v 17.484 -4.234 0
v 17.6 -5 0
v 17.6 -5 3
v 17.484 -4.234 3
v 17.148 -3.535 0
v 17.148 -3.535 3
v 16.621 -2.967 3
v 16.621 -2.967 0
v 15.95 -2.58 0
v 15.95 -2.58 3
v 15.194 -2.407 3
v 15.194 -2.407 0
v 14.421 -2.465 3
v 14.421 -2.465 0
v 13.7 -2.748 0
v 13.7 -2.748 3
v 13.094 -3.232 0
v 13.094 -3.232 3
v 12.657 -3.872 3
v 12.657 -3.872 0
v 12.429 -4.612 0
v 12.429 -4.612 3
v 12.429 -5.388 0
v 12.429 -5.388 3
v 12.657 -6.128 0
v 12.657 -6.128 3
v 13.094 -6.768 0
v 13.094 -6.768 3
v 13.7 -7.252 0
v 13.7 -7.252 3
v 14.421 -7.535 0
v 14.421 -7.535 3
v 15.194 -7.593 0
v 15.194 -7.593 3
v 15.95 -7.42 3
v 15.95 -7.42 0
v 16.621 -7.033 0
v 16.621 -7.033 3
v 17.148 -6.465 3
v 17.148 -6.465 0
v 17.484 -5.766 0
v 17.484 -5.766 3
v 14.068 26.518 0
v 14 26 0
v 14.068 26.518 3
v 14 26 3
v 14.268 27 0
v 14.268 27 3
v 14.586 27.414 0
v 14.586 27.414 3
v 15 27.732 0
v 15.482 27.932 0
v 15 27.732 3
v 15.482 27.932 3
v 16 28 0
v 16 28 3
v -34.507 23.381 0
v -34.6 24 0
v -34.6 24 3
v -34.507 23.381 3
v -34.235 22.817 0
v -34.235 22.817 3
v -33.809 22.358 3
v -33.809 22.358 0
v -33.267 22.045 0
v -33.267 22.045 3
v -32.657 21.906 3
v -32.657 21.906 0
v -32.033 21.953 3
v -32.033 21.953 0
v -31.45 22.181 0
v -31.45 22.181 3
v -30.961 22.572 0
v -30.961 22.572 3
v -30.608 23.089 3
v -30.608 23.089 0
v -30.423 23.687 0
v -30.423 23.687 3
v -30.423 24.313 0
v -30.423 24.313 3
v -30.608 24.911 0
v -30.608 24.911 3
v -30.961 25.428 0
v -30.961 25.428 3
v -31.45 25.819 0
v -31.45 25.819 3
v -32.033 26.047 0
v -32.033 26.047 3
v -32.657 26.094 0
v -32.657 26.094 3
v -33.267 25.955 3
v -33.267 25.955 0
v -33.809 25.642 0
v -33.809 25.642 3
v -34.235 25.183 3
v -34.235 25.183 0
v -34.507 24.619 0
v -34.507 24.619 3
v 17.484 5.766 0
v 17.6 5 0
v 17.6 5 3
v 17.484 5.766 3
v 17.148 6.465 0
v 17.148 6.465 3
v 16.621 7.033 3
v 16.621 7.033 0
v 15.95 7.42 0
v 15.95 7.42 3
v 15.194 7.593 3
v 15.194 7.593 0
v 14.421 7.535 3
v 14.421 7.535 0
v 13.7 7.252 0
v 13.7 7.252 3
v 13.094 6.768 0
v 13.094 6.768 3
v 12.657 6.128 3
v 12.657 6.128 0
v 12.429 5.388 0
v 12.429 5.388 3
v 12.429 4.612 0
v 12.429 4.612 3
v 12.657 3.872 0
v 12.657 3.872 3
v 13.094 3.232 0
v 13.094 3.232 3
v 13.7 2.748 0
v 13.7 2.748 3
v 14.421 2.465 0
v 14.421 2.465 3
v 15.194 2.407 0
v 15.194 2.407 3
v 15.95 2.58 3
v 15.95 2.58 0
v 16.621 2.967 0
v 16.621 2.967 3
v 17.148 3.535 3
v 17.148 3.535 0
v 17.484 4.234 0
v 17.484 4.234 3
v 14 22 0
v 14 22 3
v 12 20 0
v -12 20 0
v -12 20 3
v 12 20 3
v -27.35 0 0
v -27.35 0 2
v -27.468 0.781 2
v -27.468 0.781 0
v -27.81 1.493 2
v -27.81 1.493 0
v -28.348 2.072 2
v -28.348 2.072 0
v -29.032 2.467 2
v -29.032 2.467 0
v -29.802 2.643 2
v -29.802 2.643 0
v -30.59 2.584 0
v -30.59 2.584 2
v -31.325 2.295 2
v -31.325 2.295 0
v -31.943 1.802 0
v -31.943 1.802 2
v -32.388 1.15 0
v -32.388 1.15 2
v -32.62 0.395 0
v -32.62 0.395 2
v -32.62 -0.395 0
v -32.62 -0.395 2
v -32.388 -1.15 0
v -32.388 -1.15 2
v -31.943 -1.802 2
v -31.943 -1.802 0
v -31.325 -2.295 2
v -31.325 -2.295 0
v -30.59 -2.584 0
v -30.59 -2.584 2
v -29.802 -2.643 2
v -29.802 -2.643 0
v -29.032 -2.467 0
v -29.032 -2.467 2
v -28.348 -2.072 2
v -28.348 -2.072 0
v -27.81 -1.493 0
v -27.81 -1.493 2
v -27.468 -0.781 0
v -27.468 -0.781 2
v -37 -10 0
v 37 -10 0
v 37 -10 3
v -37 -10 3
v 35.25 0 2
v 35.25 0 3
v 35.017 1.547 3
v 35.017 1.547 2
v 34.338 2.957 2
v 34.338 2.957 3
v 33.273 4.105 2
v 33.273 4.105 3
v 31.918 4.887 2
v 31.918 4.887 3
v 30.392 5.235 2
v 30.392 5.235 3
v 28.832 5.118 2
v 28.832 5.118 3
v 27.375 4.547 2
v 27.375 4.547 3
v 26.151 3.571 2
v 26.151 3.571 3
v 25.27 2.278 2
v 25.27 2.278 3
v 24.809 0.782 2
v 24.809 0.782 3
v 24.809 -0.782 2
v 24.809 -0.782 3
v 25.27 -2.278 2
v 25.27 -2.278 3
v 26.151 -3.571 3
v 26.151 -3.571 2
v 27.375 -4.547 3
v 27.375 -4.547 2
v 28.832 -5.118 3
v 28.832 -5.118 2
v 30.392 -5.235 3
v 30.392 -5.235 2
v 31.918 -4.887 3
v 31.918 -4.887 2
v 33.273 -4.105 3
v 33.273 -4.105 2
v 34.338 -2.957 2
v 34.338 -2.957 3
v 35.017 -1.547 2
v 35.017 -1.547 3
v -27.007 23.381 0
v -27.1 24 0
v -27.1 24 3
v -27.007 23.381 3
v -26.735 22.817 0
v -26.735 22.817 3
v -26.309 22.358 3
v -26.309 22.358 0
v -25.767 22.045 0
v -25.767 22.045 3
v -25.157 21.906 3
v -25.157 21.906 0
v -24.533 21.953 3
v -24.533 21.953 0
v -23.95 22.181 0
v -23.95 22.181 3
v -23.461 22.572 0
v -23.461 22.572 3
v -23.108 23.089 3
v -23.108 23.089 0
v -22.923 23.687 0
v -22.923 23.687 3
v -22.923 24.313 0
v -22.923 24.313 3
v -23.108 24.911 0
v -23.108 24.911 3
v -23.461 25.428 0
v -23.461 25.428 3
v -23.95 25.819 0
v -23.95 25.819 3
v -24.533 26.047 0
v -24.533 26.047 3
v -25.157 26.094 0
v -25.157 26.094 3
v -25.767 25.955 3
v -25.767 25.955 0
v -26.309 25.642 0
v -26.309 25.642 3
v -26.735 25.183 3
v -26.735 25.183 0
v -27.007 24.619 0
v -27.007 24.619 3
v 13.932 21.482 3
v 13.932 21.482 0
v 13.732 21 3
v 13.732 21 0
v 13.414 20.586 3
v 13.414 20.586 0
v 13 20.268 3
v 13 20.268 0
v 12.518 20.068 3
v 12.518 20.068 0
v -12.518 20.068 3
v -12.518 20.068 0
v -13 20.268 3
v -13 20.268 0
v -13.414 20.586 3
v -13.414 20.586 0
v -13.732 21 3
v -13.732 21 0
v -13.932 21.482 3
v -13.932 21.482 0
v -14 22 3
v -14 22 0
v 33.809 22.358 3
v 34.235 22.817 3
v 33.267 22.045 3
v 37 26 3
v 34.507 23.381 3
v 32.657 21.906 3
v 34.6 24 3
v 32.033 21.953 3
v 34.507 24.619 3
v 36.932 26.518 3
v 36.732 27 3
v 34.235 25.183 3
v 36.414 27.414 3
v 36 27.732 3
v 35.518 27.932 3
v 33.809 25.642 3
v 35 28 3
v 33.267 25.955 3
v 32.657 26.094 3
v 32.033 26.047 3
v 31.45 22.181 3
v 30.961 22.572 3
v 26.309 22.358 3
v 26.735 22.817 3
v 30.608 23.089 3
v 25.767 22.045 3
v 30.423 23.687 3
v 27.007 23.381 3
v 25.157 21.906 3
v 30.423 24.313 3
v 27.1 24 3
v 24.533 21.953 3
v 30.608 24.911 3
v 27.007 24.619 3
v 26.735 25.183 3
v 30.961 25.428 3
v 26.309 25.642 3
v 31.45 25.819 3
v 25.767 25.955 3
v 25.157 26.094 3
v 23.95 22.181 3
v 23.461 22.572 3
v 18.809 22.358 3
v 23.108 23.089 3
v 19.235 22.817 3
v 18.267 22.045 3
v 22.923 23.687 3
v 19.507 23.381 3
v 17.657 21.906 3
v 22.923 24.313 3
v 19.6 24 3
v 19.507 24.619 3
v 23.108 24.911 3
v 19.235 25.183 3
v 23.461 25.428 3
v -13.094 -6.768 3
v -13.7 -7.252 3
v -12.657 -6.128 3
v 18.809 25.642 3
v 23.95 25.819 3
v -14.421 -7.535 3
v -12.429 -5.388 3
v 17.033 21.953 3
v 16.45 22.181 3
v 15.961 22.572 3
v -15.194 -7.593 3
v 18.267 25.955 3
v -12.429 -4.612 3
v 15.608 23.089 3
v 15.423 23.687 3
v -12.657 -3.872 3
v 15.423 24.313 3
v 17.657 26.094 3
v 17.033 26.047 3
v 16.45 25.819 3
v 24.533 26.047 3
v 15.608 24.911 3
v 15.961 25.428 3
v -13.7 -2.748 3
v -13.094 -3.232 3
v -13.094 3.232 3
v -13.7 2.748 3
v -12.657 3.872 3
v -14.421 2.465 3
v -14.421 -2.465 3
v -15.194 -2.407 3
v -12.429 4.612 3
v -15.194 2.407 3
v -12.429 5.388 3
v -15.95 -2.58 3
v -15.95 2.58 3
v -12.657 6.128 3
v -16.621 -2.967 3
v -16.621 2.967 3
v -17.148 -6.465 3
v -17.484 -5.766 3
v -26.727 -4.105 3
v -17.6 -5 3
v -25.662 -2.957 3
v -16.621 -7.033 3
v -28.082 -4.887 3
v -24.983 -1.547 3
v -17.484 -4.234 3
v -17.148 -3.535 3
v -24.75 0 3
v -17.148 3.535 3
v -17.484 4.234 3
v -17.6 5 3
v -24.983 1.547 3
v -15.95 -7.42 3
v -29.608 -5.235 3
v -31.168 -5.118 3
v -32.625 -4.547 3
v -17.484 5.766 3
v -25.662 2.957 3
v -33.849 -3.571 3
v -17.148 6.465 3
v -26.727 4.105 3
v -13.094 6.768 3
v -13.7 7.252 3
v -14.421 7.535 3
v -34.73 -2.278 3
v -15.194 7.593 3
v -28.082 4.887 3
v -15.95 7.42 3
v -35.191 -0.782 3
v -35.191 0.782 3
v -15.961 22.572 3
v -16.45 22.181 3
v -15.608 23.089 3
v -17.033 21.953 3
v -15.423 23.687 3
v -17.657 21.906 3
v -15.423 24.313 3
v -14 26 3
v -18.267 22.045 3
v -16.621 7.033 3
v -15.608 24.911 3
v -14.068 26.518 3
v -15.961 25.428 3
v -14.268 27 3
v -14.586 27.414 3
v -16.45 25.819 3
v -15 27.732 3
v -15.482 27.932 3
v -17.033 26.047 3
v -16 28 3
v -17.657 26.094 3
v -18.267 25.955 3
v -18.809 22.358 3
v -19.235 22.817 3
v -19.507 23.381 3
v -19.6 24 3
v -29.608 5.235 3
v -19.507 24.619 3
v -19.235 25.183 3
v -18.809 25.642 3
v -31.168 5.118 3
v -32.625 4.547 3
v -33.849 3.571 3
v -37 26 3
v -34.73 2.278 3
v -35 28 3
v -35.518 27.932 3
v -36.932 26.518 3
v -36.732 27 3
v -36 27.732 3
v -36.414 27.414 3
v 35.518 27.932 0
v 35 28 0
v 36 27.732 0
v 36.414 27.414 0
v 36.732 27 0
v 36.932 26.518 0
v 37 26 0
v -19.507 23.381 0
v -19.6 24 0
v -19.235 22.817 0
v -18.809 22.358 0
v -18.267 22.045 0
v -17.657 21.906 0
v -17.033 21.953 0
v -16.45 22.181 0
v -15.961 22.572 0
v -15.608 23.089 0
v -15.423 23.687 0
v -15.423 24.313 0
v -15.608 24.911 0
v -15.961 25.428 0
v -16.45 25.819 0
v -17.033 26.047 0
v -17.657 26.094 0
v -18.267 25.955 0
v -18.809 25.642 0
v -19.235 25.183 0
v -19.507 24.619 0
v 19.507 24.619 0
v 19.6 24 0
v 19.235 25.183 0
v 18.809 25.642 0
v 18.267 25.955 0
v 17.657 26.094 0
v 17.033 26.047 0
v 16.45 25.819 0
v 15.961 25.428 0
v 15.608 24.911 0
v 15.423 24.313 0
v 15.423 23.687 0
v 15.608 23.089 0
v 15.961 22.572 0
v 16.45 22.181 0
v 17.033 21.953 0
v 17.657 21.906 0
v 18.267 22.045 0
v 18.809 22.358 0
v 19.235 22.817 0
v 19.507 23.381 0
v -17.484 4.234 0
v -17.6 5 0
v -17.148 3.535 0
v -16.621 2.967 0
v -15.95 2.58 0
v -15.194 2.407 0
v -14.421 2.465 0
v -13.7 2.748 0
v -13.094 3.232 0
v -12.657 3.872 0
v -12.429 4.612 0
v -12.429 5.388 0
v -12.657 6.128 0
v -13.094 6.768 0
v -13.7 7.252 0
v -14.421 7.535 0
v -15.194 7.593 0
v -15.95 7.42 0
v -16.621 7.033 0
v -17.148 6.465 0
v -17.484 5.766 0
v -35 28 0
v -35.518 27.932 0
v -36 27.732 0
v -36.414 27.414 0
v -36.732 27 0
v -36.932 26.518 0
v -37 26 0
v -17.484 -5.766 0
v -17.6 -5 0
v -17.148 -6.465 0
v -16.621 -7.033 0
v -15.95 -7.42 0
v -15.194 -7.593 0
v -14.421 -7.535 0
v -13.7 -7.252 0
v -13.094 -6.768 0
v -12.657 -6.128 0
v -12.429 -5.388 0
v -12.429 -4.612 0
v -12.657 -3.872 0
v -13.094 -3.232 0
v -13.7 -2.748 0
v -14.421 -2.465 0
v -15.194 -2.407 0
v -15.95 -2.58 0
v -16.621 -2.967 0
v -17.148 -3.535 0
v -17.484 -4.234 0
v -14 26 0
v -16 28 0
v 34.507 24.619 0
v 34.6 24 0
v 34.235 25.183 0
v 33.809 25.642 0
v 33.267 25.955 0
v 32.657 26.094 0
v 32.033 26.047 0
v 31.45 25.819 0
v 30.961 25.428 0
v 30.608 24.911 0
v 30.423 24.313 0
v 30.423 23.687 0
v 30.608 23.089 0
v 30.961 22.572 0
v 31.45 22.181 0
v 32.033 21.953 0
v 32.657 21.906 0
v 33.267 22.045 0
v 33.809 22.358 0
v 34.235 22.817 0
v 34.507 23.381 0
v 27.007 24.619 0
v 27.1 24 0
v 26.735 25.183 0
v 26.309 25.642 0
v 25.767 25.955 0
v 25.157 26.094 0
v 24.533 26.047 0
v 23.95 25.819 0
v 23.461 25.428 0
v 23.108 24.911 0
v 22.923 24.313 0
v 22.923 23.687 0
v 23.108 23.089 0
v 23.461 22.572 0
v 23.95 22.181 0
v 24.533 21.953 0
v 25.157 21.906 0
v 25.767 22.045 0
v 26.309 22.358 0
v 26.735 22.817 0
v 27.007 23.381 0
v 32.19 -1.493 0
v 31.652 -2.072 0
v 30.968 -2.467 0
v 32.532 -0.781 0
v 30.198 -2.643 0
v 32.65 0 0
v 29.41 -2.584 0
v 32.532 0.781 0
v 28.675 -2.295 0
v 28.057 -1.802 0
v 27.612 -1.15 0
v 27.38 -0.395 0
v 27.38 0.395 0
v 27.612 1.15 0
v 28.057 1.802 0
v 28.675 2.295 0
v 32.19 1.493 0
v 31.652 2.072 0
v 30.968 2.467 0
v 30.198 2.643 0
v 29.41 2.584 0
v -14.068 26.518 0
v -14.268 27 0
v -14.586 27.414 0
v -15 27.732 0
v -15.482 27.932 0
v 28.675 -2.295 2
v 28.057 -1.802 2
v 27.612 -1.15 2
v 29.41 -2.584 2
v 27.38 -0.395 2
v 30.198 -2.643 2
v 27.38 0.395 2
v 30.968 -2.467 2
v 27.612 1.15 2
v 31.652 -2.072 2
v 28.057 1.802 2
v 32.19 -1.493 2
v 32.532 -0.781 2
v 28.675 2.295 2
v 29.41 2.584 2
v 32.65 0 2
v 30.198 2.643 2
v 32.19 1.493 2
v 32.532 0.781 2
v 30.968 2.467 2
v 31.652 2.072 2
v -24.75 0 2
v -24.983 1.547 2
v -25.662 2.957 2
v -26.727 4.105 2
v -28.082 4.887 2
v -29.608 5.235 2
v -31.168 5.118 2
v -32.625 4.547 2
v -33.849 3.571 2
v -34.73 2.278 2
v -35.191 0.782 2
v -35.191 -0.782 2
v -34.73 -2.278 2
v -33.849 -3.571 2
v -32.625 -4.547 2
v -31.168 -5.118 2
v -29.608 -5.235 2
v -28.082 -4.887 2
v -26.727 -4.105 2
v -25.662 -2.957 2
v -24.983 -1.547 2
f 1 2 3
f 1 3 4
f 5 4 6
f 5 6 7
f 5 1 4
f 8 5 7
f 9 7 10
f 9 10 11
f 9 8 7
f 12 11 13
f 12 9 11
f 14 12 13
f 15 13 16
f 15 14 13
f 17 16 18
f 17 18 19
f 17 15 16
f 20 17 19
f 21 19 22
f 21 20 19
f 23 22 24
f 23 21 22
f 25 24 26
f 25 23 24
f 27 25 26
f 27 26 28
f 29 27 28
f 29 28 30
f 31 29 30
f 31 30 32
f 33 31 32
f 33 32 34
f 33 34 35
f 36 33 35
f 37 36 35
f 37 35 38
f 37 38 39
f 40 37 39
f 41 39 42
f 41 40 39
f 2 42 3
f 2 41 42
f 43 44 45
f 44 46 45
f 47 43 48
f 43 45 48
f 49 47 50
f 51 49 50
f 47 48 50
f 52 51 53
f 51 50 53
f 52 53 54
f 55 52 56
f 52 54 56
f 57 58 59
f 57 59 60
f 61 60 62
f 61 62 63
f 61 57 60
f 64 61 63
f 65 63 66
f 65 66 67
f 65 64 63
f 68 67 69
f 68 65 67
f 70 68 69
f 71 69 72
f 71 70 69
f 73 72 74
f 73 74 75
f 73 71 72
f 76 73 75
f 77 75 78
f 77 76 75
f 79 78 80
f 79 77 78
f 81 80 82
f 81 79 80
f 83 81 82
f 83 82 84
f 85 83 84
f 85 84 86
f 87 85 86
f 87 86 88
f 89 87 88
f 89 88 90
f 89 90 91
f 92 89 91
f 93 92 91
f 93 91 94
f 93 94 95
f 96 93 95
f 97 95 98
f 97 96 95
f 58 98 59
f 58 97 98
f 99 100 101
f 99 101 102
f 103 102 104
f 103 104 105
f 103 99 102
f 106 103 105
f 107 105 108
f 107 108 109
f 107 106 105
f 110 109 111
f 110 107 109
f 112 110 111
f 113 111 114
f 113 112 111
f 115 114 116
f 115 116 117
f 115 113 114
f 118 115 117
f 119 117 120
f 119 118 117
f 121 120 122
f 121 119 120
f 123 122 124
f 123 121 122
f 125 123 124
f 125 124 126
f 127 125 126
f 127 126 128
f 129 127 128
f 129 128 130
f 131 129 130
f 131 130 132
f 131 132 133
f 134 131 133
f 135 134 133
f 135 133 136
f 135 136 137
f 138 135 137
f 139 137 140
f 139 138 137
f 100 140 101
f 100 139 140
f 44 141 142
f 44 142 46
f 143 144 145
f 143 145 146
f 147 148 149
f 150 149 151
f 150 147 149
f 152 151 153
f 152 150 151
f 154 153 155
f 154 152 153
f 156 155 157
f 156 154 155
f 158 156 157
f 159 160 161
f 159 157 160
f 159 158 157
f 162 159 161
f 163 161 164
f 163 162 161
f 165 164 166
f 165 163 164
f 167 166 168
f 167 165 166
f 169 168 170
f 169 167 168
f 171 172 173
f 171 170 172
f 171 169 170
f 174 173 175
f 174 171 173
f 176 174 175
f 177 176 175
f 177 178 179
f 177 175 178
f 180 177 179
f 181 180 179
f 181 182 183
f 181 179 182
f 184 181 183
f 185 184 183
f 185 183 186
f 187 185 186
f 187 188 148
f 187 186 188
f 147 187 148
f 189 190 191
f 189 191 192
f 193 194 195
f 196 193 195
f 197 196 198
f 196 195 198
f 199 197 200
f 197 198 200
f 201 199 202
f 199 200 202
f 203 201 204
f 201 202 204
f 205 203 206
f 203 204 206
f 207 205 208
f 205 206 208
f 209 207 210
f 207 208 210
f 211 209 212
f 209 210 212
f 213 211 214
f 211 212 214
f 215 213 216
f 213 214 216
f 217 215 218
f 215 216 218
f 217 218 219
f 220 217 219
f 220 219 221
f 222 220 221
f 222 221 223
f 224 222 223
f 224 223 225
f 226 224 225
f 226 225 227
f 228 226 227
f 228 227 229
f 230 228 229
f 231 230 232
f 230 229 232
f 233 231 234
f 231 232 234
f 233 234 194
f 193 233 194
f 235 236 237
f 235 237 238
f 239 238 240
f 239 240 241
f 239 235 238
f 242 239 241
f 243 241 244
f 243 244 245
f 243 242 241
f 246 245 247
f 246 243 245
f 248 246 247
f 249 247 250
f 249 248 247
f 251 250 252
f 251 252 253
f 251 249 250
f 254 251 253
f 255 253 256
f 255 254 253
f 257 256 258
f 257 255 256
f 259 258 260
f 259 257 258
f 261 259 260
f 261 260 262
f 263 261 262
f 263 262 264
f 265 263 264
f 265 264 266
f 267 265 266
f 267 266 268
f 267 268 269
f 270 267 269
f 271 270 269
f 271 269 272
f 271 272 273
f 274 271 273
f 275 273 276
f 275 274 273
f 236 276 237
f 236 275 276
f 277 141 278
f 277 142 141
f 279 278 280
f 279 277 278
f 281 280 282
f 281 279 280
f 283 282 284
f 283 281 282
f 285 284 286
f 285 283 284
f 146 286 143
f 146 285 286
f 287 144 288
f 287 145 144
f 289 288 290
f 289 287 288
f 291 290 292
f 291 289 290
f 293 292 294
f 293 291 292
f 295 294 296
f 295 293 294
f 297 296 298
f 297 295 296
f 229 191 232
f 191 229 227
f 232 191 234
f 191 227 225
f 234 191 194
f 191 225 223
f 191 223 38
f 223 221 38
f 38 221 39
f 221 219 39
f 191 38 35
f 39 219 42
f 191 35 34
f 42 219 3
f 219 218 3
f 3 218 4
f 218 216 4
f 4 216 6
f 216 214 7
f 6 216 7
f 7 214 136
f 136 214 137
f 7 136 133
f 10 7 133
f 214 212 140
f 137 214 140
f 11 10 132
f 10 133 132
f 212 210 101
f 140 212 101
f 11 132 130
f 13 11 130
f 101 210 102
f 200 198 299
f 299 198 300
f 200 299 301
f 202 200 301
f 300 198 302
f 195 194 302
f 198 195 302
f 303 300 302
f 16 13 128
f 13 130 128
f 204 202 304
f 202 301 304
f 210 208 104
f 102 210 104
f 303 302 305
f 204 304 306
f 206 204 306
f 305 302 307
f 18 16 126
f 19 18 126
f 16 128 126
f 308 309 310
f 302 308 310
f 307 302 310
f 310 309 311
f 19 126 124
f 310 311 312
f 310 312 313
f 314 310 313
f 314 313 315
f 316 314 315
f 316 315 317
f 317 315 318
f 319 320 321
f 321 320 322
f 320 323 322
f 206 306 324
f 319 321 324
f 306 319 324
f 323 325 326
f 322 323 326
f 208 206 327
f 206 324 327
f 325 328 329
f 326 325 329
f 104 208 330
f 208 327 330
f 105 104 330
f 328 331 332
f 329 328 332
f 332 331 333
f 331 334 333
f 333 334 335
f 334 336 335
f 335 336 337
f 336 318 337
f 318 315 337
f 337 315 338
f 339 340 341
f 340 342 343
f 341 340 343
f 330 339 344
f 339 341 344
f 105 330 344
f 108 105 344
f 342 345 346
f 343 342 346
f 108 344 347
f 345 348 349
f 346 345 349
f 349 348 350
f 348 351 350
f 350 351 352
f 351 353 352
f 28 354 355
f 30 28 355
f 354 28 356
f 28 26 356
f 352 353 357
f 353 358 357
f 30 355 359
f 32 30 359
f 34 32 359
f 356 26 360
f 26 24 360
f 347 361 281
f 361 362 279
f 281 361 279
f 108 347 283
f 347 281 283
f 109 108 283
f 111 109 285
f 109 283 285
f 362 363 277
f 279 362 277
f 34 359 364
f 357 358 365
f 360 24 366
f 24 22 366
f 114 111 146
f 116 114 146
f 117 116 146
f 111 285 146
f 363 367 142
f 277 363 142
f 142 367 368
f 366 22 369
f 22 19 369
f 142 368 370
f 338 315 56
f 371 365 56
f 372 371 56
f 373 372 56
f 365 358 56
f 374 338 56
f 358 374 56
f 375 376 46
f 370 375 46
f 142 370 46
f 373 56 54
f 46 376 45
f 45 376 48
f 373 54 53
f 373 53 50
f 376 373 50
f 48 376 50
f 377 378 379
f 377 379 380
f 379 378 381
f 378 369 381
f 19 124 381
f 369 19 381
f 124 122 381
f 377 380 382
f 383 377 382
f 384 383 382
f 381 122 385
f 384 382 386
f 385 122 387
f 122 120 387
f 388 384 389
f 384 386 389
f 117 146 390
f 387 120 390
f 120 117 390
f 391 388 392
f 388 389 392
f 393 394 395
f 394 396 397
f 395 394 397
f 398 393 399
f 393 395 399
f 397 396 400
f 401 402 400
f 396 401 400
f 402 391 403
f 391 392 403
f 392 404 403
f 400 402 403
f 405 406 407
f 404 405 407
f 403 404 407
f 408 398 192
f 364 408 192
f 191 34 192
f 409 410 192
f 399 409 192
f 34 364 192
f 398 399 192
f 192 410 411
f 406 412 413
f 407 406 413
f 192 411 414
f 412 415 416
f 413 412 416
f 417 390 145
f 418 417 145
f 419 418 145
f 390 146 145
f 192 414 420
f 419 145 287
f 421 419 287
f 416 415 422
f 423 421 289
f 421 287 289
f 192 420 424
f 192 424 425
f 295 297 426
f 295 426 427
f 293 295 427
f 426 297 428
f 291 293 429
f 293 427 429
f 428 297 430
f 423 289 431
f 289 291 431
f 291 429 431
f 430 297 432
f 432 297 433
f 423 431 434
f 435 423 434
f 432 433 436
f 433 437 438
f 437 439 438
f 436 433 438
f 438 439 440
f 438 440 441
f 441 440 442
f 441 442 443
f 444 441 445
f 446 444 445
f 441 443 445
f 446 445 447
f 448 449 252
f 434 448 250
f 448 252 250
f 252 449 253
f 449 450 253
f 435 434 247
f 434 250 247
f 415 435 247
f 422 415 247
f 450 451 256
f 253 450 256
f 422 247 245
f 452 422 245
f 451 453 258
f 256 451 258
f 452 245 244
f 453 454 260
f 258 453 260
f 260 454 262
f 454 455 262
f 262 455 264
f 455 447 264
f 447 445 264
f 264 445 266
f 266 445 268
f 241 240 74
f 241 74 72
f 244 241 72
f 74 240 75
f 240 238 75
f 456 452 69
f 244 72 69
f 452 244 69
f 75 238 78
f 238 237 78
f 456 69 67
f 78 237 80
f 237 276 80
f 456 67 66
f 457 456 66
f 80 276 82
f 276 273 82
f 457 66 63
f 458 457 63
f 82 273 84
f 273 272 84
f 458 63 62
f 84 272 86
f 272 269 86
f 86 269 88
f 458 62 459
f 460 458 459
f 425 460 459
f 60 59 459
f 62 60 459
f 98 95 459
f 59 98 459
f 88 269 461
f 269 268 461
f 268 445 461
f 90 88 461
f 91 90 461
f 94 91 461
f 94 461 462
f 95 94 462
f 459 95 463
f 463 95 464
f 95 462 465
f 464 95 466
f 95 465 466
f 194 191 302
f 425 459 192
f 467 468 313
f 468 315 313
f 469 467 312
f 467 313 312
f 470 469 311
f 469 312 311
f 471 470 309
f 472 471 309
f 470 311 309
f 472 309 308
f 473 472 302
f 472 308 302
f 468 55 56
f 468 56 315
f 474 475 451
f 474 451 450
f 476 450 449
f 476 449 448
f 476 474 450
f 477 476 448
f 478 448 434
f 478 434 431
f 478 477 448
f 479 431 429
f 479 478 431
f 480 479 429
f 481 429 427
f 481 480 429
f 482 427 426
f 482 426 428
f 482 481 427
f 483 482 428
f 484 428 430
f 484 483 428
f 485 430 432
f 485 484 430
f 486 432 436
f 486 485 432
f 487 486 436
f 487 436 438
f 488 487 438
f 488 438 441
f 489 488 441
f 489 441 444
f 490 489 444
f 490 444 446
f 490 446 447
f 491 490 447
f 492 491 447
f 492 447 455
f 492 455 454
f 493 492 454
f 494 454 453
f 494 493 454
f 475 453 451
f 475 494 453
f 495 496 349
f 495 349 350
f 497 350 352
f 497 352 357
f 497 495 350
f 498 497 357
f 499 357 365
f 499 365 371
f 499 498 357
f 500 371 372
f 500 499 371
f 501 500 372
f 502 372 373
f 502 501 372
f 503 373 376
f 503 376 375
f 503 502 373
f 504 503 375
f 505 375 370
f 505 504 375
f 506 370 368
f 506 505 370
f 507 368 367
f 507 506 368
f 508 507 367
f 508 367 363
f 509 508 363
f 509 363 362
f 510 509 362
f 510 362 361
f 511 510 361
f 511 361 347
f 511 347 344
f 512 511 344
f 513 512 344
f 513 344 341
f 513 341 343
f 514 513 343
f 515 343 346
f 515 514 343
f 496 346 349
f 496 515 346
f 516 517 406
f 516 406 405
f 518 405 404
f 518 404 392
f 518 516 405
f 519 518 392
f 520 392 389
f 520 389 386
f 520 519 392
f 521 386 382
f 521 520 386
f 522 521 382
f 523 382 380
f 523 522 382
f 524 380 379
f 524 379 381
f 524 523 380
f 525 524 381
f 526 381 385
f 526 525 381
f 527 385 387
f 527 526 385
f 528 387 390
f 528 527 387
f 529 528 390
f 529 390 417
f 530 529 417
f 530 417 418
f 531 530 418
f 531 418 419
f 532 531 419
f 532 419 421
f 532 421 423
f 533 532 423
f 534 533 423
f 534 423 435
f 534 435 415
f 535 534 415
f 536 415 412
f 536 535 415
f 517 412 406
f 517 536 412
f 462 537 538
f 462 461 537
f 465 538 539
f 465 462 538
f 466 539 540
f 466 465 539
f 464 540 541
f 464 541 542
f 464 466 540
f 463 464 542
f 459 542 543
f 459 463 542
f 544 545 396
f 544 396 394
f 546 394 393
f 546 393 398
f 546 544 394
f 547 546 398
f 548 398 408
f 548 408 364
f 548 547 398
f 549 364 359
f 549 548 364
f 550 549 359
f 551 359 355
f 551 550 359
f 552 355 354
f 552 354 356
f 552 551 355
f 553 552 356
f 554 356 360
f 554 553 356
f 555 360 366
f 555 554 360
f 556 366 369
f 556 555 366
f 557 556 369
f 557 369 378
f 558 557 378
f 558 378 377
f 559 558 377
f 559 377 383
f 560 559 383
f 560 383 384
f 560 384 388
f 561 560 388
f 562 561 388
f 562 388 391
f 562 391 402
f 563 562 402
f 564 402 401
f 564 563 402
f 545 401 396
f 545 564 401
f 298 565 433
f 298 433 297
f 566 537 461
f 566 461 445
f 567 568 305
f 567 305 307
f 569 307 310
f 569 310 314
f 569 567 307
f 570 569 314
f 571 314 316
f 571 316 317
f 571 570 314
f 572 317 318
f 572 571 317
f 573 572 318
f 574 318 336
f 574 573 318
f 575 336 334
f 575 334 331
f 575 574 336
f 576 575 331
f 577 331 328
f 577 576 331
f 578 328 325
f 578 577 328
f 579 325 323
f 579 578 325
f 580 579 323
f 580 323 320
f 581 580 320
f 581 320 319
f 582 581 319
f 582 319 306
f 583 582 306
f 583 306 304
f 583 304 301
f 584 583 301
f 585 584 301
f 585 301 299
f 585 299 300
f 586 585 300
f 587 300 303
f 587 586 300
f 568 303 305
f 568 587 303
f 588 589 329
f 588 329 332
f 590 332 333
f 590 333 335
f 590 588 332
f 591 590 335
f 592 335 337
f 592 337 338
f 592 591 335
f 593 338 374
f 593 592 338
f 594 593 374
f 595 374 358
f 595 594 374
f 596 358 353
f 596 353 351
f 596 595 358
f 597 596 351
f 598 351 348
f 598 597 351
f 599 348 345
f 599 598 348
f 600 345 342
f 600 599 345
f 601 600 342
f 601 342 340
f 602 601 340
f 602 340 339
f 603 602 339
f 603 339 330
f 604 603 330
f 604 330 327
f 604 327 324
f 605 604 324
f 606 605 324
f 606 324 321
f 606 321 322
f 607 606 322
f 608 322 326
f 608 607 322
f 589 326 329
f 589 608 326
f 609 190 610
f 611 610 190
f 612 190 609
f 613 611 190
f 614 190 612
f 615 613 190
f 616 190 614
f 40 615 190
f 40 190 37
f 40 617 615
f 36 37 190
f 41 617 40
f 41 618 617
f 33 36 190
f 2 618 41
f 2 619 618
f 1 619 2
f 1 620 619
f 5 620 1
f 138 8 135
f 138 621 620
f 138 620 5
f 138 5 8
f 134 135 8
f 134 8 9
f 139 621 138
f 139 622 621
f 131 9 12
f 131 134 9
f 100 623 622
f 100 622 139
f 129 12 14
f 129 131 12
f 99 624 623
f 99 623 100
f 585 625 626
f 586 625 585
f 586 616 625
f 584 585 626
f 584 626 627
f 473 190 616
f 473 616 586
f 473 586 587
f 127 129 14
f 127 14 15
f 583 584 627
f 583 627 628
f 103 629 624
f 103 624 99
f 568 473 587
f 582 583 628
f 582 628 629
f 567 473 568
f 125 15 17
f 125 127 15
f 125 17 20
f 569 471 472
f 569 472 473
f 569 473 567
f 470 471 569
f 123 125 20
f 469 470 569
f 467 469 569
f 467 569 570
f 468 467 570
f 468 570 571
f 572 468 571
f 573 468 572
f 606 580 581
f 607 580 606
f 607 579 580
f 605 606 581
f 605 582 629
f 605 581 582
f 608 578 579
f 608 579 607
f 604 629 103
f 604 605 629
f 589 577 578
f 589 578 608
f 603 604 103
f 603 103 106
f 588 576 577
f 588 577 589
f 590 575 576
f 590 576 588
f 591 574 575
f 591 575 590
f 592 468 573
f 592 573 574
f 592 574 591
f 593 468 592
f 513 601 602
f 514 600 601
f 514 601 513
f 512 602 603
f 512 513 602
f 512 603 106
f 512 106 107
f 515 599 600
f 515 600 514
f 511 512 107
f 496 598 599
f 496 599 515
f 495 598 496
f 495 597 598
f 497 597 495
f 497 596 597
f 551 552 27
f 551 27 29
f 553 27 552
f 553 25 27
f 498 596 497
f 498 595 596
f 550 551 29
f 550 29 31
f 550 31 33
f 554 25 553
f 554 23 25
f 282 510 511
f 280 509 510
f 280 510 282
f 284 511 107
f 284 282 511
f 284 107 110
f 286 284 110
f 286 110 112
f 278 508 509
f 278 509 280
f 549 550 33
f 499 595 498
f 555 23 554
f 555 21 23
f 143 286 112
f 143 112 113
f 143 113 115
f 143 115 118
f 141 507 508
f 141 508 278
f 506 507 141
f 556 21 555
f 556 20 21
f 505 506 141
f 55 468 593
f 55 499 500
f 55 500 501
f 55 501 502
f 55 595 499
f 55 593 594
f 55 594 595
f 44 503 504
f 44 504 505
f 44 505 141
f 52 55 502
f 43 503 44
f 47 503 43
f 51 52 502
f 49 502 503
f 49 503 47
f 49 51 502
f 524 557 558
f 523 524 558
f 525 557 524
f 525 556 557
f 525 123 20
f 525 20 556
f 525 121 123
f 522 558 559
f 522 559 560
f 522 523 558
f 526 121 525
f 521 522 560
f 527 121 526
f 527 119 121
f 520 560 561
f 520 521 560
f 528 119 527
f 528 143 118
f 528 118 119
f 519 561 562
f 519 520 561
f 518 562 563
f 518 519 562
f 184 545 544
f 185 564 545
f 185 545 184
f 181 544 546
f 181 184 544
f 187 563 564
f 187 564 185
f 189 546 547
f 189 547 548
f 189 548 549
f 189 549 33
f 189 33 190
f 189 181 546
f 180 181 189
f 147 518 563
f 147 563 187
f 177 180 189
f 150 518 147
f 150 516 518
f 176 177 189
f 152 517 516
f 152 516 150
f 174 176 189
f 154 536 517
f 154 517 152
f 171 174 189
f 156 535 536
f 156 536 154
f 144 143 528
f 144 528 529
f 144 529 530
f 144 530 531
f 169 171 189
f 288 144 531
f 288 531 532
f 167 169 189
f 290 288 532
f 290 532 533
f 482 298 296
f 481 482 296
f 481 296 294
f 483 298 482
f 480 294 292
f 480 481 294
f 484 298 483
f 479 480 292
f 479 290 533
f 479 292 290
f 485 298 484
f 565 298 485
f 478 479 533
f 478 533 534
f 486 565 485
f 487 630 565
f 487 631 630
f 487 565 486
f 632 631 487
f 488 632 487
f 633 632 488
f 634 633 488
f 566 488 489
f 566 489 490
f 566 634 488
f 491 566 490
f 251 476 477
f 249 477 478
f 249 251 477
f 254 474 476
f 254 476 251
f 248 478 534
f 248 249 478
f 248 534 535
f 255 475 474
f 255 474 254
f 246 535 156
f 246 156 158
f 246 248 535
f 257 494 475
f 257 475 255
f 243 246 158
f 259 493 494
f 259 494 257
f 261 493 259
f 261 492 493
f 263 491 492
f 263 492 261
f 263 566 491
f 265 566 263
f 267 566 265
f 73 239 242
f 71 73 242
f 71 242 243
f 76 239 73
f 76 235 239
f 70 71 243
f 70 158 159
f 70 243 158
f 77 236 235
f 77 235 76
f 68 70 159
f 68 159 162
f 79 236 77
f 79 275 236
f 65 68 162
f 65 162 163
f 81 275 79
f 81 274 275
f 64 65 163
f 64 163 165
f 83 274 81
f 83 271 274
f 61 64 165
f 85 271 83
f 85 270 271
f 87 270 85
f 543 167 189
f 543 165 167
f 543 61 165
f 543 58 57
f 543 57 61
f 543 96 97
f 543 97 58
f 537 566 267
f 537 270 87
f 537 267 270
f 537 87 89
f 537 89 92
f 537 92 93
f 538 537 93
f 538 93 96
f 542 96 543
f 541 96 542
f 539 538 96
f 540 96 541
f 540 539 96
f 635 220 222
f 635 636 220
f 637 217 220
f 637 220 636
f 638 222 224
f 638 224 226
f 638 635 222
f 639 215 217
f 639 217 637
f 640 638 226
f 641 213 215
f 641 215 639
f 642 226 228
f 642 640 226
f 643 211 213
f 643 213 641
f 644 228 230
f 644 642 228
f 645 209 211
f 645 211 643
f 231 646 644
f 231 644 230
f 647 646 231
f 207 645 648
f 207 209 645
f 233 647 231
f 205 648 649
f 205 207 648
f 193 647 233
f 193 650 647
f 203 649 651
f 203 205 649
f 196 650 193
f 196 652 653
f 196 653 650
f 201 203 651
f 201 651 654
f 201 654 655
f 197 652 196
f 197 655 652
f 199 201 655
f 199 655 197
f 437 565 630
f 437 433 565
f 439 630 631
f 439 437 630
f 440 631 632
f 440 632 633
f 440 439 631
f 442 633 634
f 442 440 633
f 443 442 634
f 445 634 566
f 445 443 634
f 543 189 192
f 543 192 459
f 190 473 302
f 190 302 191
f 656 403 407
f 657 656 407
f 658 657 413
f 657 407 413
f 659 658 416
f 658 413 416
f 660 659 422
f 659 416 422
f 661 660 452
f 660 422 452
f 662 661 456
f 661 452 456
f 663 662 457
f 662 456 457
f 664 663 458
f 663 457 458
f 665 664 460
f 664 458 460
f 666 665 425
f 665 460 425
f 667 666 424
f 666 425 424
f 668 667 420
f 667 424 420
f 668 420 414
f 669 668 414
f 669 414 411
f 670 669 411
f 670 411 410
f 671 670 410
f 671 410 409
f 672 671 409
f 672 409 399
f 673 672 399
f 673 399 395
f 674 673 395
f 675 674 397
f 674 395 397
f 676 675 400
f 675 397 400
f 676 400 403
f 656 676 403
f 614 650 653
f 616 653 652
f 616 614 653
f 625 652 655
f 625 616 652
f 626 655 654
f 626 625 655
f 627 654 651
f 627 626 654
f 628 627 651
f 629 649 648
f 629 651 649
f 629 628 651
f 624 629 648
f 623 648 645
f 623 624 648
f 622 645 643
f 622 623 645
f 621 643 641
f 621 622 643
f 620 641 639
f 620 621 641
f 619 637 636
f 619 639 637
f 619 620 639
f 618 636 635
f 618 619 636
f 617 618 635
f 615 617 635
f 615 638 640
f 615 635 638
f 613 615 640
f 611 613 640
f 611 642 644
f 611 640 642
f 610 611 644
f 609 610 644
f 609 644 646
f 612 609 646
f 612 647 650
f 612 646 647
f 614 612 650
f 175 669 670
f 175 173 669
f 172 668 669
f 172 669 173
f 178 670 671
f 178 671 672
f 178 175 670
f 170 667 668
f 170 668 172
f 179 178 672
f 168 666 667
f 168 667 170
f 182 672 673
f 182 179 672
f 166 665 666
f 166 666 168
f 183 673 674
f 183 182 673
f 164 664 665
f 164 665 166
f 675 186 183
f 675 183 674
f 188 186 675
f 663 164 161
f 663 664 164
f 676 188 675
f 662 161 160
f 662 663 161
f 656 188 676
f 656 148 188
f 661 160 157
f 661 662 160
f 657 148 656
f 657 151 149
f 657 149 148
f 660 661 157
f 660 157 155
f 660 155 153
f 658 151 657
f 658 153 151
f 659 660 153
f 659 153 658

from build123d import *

# Parameters (mm, degrees)
SKETCH_1_R          = 2.1
SKETCH_1_R_2        = 2.65
SKETCH_1_R_3        = 2.6
EXTRUDE_1_DEPTH     = 3
FILLET_1_R          = 2
SKETCH_2_R          = 5.25
CUT_EXTRUDE_1_DEPTH = 1


with BuildPart() as part:
    # 草图1 → 凸台-拉伸1 (new body)
    with BuildSketch(Plane.XY):
        Polygon((14, 20), (14, 28), (37, 28), (37, -10), (-37, -10), (-37, 28), (-14, 28), (-14, 20), align=None)
        with Locations((17.5, 24)):
            Circle(SKETCH_1_R, mode=Mode.SUBTRACT)
        with Locations((25, 24)):
            Circle(SKETCH_1_R, mode=Mode.SUBTRACT)
        with Locations((32.5, 24)):
            Circle(SKETCH_1_R, mode=Mode.SUBTRACT)
        with Locations(Location((-32.5, 24, 0), (0, 0, 180))):
            Circle(SKETCH_1_R, mode=Mode.SUBTRACT)
        with Locations(Location((-17.5, 24, 0), (0, 0, 180))):
            Circle(SKETCH_1_R, mode=Mode.SUBTRACT)
        with Locations(Location((-25, 24, 0), (0, 0, 180))):
            Circle(SKETCH_1_R, mode=Mode.SUBTRACT)
        with Locations((30, 0)):
            Circle(SKETCH_1_R_2, mode=Mode.SUBTRACT)
        with Locations((-30, 0)):
            Circle(SKETCH_1_R_2, mode=Mode.SUBTRACT)
        with Locations((15, 5)):
            Circle(SKETCH_1_R_3, mode=Mode.SUBTRACT)
        with Locations((15, -5)):
            Circle(SKETCH_1_R_3, mode=Mode.SUBTRACT)
        with Locations(Location((-15, 5, 0), (0, 0, 180))):
            Circle(SKETCH_1_R_3, mode=Mode.SUBTRACT)
        with Locations(Location((-15, -5, 0), (0, 0, 180))):
            Circle(SKETCH_1_R_3, mode=Mode.SUBTRACT)
    extrude(amount=EXTRUDE_1_DEPTH)

    # 圆角1
    fillet_1_edges = [part.edges().sort_by_distance(p)[0] for p in [
        (14, 20, 1.5),
        (14, 28, 1.5),
        (37, 28, 1.5),
        (-37, 28, 1.5),
        (-14, 28, 1.5),
        (-14, 20, 1.5),
    ]]
    fillet(fillet_1_edges, radius=FILLET_1_R)

    # 草图2 → 切除-拉伸1 (cut)
    with BuildSketch(Plane.XY.offset(3)):
        with Locations((30, 0)):
            Circle(SKETCH_2_R)
        with Locations((-30, 0)):
            Circle(SKETCH_2_R)
    extrude(amount=-CUT_EXTRUDE_1_DEPTH, mode=Mode.SUBTRACT)


solid = part.part
